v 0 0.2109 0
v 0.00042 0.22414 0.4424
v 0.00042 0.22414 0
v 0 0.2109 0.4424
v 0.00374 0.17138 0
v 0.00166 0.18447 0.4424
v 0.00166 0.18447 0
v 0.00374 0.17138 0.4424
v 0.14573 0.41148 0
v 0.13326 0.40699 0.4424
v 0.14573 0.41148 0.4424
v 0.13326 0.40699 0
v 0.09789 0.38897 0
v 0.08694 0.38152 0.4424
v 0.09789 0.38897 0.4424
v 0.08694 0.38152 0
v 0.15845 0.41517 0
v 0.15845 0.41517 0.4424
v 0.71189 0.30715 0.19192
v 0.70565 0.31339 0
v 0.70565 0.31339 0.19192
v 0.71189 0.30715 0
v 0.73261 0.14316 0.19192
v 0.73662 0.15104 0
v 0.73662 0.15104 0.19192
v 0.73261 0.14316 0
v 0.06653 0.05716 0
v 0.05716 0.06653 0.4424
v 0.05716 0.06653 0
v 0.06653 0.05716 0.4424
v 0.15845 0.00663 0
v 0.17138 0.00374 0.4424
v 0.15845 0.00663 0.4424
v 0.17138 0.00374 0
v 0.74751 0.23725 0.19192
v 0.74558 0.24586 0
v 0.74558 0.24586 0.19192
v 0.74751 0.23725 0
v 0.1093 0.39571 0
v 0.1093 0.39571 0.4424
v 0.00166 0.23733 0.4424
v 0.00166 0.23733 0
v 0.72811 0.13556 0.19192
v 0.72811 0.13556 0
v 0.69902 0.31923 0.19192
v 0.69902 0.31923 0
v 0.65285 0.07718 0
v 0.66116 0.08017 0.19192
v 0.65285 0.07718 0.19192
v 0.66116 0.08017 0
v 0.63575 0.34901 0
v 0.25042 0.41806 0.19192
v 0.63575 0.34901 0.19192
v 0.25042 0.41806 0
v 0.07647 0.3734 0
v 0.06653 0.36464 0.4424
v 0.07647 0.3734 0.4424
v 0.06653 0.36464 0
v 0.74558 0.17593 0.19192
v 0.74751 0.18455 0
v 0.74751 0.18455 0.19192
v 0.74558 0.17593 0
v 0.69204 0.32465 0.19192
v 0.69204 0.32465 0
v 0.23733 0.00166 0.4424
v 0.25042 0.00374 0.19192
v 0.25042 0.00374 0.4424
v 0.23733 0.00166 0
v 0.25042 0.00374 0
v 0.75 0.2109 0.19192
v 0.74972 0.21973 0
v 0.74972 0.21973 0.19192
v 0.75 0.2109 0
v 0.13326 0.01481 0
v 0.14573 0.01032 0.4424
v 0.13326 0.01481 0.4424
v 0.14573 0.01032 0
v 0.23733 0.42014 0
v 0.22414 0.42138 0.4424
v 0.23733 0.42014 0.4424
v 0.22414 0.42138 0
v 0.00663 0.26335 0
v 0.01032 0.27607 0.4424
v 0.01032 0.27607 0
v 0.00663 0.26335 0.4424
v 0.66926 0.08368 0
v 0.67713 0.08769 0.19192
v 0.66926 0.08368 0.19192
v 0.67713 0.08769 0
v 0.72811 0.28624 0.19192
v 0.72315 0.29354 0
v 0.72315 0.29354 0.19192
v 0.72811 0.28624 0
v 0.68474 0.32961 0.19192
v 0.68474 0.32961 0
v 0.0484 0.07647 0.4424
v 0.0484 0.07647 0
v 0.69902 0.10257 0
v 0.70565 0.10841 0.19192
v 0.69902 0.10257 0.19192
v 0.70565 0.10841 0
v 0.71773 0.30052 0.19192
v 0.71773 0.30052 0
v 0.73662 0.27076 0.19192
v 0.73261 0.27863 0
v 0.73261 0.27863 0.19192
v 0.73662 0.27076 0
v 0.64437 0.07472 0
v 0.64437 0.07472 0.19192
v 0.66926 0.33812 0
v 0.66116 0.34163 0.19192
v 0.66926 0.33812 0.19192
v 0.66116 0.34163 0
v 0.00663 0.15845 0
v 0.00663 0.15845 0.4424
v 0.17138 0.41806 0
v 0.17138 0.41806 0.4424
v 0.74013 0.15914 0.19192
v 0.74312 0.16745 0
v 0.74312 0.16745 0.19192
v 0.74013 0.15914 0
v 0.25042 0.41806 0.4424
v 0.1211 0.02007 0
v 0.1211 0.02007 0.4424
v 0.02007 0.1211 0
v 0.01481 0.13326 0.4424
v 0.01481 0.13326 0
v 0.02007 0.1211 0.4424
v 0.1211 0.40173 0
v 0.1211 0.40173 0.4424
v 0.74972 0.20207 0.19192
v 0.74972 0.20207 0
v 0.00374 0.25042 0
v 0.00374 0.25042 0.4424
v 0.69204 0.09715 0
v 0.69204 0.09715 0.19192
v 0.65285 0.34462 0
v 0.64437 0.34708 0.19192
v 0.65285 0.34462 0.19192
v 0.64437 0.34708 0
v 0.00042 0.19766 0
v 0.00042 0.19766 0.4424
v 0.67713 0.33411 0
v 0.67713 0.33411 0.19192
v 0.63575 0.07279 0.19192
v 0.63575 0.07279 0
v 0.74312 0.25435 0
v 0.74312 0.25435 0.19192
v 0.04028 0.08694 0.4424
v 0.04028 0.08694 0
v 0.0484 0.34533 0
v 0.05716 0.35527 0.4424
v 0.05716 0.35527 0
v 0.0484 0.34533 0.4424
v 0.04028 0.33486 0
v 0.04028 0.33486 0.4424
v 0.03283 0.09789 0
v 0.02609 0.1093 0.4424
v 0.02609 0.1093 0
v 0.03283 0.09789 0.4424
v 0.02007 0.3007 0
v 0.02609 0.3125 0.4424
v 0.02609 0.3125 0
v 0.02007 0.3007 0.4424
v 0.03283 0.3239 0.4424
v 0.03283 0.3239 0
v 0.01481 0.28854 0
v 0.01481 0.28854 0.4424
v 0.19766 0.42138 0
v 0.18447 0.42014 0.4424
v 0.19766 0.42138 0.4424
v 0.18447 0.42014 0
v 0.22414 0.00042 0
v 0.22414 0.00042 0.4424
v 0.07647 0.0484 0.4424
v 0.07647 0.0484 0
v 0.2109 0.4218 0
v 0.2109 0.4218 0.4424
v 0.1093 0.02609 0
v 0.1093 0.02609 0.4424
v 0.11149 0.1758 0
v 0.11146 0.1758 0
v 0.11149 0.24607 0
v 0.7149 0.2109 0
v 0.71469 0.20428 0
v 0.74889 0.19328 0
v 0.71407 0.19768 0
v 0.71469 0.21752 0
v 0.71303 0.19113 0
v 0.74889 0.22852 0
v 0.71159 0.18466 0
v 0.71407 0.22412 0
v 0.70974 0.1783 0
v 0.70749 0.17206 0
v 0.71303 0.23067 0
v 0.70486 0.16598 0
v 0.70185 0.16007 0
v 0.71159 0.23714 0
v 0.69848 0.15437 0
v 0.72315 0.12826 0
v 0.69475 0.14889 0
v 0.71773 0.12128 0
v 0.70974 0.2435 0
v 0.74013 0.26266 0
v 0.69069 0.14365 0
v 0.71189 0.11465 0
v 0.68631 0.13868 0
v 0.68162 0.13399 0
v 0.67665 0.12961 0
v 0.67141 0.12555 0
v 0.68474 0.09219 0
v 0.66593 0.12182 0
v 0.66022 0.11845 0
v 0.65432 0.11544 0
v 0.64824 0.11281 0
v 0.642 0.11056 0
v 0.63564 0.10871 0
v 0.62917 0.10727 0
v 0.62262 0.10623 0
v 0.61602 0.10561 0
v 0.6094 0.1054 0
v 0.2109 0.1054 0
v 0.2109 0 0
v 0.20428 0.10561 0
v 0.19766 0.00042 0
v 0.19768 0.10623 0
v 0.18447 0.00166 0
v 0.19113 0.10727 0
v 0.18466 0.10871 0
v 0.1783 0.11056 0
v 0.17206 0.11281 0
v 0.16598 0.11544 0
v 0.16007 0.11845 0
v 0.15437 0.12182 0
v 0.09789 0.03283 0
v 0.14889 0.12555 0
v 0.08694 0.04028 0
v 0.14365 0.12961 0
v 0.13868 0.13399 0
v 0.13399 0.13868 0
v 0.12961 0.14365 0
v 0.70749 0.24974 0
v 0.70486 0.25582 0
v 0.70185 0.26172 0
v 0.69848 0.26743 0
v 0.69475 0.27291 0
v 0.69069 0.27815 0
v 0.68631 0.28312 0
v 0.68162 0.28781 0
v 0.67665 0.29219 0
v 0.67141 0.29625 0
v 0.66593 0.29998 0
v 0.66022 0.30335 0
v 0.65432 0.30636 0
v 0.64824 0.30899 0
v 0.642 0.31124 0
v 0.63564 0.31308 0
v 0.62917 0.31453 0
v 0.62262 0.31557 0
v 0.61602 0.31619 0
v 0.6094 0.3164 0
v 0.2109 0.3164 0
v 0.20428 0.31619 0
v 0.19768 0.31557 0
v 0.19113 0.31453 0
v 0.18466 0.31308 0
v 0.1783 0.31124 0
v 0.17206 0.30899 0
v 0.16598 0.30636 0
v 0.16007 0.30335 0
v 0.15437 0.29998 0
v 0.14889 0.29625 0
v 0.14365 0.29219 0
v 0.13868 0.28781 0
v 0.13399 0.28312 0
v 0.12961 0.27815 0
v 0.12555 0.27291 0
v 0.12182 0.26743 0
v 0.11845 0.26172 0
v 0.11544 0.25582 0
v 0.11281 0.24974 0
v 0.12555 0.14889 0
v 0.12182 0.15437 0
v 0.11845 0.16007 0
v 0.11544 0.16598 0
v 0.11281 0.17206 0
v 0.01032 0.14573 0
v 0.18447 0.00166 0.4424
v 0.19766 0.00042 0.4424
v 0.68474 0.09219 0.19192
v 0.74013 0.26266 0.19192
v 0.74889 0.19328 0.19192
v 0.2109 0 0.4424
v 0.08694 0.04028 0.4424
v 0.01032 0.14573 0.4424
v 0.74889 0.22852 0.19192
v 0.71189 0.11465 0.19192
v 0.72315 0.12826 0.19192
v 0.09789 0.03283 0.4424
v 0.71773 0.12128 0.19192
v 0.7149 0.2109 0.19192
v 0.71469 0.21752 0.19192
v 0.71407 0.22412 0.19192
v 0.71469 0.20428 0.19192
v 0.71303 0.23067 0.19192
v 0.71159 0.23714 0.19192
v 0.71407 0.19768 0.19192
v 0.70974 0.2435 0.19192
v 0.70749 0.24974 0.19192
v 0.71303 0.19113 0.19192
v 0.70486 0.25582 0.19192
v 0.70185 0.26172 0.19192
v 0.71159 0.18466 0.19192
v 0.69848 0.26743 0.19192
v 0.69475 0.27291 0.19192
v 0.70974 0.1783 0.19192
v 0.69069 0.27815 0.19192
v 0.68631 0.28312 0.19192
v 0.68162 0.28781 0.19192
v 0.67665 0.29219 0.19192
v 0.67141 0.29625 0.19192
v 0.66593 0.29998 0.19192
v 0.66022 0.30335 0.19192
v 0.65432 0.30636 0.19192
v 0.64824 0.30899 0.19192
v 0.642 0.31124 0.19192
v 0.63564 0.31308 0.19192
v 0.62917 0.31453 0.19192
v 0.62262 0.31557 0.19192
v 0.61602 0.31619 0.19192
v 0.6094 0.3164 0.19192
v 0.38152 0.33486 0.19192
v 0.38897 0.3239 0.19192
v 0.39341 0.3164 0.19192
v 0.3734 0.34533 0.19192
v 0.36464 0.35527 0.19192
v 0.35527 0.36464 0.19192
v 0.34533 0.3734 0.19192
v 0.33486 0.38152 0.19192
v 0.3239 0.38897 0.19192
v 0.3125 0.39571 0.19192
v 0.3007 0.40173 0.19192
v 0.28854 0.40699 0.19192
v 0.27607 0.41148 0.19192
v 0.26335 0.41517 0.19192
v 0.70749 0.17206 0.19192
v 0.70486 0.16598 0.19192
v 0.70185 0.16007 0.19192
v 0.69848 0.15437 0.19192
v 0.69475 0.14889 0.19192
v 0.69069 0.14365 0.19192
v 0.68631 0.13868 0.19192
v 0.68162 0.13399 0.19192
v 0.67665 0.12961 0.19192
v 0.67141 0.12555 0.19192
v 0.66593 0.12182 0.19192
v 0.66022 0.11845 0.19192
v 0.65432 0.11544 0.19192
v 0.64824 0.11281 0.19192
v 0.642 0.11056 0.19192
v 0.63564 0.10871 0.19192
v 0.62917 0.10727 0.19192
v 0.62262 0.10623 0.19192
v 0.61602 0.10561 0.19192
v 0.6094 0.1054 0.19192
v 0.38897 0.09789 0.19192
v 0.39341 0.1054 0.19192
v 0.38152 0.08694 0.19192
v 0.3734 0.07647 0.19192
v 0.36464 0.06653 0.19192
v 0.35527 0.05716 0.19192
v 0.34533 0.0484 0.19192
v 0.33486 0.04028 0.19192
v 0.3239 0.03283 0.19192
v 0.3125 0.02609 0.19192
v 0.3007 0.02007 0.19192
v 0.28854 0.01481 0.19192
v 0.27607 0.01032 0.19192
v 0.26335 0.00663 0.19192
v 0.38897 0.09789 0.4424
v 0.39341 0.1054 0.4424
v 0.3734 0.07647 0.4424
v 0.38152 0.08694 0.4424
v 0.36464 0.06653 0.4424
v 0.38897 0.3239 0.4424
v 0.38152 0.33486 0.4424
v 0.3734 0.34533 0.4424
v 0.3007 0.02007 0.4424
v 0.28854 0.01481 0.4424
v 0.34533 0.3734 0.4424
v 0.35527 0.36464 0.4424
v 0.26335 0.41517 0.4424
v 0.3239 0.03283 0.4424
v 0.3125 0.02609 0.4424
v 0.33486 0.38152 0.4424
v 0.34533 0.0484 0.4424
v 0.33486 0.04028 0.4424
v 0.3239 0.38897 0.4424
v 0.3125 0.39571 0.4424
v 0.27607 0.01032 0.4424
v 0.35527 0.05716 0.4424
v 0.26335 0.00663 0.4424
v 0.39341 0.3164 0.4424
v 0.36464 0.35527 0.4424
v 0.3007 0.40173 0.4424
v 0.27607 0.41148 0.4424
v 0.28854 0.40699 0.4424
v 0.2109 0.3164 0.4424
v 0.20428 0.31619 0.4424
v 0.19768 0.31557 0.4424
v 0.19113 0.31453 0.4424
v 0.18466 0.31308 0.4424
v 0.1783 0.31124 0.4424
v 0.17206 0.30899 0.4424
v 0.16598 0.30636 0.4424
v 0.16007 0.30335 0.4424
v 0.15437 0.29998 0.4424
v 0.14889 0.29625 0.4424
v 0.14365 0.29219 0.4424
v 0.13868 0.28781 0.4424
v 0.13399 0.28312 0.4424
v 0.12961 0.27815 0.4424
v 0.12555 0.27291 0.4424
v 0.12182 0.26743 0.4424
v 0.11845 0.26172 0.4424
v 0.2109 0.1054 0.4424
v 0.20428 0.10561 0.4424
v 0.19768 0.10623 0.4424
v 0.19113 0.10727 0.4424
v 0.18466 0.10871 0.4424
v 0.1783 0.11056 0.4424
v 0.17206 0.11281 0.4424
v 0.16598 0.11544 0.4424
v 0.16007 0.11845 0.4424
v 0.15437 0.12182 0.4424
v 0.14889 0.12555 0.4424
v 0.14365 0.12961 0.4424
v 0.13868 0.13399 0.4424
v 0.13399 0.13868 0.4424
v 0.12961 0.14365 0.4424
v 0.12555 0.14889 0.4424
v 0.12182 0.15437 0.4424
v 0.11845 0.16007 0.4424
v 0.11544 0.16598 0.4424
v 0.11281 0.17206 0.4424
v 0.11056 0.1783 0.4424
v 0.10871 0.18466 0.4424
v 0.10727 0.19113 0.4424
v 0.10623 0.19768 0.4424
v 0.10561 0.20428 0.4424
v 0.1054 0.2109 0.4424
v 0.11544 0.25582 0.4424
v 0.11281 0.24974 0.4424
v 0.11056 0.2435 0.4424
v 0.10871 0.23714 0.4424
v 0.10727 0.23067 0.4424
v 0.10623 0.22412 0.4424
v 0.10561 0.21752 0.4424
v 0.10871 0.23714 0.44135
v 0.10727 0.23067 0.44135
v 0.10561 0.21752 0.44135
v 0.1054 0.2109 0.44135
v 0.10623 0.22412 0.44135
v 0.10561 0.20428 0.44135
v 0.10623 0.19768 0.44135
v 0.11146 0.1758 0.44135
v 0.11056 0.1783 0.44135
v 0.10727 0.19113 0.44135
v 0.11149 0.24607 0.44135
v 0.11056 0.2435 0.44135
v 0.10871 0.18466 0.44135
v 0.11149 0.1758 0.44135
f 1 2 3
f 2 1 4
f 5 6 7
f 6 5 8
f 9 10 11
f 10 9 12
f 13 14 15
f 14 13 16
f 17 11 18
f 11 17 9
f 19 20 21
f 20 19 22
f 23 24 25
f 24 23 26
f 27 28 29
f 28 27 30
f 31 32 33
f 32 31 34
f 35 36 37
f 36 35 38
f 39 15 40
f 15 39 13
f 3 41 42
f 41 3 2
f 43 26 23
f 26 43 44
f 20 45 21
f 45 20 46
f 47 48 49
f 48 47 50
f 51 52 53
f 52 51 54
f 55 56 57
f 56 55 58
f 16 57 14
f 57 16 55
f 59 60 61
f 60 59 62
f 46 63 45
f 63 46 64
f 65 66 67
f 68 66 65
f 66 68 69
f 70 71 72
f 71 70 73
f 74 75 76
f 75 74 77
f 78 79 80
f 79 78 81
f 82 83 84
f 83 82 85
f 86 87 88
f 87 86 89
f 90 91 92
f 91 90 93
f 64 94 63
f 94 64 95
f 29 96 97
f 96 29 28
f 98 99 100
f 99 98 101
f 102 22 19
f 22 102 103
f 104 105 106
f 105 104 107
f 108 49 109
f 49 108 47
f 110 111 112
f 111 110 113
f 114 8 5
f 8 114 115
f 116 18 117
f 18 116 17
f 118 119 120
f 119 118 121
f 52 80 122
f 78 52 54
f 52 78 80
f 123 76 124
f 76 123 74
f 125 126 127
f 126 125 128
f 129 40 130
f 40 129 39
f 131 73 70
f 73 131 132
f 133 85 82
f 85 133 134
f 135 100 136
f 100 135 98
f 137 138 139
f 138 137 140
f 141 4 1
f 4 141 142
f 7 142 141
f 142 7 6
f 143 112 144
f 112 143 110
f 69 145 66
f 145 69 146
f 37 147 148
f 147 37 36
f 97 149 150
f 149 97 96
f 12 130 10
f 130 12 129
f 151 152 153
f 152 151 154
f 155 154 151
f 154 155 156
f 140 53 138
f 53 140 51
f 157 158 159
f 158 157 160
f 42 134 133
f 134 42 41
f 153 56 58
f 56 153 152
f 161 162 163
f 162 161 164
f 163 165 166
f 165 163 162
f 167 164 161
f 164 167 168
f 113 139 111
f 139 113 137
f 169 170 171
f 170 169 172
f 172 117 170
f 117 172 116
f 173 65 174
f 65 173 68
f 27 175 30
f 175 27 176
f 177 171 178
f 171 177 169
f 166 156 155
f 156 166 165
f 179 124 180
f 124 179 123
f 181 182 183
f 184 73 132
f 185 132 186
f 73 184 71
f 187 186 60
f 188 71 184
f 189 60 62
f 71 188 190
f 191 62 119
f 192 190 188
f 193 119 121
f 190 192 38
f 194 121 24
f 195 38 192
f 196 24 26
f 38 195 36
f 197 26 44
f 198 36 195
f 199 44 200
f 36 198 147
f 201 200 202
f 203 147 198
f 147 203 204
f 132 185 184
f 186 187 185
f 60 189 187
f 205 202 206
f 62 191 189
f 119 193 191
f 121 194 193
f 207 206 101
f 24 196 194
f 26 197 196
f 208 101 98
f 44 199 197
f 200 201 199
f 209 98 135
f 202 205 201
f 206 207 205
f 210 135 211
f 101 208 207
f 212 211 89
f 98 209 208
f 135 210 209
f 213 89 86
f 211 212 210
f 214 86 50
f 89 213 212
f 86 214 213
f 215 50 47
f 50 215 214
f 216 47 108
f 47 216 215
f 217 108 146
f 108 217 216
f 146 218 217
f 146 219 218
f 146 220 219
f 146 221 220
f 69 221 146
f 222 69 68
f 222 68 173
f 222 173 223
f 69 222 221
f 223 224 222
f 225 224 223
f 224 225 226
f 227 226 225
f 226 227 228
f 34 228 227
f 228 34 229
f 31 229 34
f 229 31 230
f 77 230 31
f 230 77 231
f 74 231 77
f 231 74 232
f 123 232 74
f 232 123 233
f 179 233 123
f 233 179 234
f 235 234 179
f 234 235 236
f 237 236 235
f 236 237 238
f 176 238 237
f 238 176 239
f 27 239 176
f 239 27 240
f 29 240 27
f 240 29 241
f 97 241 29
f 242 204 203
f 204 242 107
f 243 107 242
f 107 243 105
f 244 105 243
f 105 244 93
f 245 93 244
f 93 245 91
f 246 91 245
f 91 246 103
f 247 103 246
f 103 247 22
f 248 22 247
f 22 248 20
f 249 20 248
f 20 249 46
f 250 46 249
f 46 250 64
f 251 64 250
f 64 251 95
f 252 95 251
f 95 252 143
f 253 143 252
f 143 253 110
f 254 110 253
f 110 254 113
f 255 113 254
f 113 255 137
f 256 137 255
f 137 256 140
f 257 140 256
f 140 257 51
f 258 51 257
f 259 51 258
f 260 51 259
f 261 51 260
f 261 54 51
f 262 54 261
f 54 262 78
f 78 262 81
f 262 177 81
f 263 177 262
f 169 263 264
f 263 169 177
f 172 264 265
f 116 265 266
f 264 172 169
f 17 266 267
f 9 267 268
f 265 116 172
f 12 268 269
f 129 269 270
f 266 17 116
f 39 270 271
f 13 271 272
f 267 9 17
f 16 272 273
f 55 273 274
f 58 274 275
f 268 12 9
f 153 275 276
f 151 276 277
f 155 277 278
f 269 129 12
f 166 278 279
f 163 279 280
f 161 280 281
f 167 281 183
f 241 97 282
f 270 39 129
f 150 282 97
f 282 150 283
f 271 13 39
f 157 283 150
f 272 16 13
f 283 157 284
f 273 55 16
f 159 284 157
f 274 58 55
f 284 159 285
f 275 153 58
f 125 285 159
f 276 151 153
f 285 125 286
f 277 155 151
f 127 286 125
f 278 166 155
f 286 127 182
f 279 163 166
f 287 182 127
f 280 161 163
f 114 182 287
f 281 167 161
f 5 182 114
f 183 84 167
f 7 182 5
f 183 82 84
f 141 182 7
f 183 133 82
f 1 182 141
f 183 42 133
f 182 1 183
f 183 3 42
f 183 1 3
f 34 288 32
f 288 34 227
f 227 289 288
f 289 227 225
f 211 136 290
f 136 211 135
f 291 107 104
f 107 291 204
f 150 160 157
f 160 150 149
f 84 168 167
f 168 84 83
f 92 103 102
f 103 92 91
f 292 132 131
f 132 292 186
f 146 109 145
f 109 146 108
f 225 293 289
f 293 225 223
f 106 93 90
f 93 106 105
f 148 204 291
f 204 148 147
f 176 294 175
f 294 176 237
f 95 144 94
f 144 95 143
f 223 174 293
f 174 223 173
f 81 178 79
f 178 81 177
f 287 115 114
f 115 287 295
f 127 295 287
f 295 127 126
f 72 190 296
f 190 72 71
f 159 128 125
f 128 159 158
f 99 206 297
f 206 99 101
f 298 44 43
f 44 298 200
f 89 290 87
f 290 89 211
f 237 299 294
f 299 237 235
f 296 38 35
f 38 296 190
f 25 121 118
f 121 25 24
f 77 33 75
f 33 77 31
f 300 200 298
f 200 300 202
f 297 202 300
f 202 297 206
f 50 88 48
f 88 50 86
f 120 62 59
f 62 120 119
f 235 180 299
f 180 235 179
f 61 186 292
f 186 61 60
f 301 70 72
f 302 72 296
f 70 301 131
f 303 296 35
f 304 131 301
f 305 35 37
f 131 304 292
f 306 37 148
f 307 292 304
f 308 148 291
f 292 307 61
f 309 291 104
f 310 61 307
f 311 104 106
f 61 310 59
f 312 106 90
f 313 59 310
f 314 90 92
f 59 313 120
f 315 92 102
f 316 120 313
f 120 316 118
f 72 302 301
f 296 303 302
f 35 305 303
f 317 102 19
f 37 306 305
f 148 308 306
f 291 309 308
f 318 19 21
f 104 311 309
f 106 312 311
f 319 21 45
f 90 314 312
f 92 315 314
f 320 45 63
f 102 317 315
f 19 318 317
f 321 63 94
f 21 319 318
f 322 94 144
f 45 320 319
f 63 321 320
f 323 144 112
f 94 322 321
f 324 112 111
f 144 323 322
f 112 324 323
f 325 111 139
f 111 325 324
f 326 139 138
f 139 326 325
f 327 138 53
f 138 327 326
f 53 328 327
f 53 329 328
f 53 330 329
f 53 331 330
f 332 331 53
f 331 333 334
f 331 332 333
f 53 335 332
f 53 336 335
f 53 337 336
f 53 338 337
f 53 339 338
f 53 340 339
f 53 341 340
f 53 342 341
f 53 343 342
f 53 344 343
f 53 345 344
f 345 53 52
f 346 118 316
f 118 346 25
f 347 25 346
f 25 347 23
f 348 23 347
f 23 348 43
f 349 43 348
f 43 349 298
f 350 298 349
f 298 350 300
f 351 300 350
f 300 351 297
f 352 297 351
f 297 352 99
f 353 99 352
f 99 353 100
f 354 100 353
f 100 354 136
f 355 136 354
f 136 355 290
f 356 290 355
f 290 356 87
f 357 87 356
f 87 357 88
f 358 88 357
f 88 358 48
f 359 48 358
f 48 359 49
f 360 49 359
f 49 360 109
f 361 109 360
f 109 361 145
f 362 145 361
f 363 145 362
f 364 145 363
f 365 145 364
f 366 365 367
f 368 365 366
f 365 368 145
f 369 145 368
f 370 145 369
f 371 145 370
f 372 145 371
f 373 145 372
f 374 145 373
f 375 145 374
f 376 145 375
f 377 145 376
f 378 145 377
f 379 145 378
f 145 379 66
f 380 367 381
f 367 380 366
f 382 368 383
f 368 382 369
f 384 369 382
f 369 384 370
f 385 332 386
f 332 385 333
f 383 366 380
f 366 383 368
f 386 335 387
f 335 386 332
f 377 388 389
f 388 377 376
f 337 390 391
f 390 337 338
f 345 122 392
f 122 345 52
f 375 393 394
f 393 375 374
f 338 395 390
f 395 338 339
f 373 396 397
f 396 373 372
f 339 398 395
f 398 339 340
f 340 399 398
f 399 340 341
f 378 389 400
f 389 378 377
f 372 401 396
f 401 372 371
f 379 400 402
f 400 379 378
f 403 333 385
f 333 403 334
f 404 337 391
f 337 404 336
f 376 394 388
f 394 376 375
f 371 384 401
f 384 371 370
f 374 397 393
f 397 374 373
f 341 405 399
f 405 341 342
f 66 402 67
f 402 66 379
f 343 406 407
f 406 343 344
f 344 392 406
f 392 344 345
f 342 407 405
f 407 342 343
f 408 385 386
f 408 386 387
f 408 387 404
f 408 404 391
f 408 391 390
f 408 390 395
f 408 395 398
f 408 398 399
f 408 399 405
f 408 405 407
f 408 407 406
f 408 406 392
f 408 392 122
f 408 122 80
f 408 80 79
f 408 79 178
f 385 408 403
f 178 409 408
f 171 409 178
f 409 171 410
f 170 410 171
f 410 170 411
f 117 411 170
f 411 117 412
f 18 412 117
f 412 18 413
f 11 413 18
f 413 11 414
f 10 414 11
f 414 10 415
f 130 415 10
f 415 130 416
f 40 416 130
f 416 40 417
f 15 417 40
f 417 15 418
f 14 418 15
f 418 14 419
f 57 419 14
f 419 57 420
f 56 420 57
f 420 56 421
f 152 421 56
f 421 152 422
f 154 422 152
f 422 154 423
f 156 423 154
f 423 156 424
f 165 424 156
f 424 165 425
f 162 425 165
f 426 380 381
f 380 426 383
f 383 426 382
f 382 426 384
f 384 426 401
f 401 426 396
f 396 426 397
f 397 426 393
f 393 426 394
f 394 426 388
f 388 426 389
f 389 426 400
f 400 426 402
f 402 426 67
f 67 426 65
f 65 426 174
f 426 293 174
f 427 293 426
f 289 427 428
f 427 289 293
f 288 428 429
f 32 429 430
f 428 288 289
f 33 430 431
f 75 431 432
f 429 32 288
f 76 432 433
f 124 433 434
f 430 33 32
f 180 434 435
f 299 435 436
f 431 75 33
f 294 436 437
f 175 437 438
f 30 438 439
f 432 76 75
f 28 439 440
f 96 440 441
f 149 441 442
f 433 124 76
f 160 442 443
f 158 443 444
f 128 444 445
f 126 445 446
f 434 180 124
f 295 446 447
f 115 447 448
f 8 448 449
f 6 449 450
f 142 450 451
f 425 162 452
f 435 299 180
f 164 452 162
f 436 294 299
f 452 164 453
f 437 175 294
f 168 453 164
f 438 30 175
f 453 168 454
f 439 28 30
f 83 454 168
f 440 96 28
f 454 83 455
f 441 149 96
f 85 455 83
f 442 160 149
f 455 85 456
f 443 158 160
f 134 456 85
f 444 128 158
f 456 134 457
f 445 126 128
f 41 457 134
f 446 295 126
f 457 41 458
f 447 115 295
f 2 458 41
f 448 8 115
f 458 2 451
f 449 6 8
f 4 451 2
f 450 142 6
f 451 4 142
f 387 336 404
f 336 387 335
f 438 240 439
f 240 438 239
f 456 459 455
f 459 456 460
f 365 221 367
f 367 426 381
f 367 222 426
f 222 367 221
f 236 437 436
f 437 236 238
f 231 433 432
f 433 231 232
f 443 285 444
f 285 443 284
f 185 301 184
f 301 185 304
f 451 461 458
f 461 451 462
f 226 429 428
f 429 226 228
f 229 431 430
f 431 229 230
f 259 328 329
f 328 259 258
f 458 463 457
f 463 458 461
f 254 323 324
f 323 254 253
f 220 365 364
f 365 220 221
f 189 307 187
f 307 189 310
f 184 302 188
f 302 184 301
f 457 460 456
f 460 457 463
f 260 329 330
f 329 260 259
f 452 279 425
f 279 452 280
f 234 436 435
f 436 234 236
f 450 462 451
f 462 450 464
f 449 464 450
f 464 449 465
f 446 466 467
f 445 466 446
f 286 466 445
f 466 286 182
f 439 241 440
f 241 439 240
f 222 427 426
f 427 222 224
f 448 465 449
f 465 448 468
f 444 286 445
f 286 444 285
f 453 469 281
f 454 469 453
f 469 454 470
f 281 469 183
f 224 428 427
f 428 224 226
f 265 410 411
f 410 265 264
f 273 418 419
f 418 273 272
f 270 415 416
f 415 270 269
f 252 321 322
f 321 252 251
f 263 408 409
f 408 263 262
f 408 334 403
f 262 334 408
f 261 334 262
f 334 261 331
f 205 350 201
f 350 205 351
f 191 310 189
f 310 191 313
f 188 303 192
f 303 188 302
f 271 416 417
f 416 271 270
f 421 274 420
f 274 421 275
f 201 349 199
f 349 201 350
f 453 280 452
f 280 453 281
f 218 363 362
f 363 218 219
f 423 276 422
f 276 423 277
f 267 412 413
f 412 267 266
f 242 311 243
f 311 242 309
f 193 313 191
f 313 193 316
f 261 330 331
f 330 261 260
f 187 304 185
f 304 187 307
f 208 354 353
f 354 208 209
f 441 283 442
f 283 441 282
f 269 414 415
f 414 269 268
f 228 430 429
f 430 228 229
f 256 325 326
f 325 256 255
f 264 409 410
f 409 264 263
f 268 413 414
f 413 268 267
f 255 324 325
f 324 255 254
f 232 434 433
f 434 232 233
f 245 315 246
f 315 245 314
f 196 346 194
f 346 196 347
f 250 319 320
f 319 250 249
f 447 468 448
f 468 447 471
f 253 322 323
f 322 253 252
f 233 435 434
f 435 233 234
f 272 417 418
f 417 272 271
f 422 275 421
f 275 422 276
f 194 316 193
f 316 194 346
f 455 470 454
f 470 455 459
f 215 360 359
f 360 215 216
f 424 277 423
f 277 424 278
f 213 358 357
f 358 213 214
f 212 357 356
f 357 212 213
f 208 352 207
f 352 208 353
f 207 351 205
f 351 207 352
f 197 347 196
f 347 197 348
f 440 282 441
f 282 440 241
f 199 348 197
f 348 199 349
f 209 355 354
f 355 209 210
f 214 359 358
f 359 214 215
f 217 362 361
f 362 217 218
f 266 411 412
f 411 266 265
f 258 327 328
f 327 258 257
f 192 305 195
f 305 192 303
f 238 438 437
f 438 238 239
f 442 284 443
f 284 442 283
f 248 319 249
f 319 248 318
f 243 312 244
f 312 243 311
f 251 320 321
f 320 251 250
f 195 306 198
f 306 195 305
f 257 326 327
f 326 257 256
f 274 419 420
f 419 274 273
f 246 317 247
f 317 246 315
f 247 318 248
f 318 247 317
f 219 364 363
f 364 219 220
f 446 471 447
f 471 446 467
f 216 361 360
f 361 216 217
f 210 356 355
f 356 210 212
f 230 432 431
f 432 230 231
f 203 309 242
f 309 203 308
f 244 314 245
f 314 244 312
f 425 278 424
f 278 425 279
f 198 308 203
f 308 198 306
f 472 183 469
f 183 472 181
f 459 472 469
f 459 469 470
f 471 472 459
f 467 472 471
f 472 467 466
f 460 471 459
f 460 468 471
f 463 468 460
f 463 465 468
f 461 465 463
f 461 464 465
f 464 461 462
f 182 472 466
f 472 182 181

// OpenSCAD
// --- Parameters ---

// Base dimensions
base_length = 0.75;
base_width = 0.421875;
base_height = 0.191921;

// Left circular profile (Forms the left side of the base and the taller section)
left_center_x = 0.2109;
left_center_y = 0.2109;
left_outer_r = 0.2109;
left_inner_r = 0.1055; // Inner radius matching the slot opening

// Right circular profile (Forms the right side of the base)
right_center_x = 0.6094;
right_center_y = 0.2109;
right_outer_r = 0.1406;
right_inner_r = 0.1055;

// Taller section height (Extruded from base datum)
tall_height = 0.4424;

// Upright tab dimensions and position
tab_length = 0.041188;
tab_width = 0.070313;
tab_height = 0.441346;
tab_offset_x = 0.0703;
tab_offset_y = 0.1758;

// Global resolution for smooth curves
$fn = 100;

// --- Main Model ---

union() {
    // Main body with voids subtracted
    difference() {
        // Solid bodies
        union() {
            // Lower base extrusion
            // Formed by hulling the two outer circular profiles to create a continuous span
            linear_extrude(height = base_height) {
                hull() {
                    translate([left_center_x, left_center_y]) 
                        circle(r = left_outer_r);
                    translate([right_center_x, right_center_y]) 
                        circle(r = right_outer_r);
                }
            }
            
            // Taller circular solid section
            // Positioned over the left-side axis, starting from the base datum (Z=0)
            linear_extrude(height = tall_height) {
                translate([left_center_x, left_center_y]) 
                    circle(r = left_outer_r);
            }
        }
        
        // Inner openings / true voids
        // Formed as a rounded slot connecting the left and right inner radii
        // Cut through the entire height of the model
        translate([0, 0, -1]) {
            linear_extrude(height = tall_height + 2) {
                hull() {
                    translate([left_center_x, left_center_y]) 
                        circle(r = left_inner_r);
                    translate([right_center_x, right_center_y]) 
                        circle(r = right_inner_r);
                }
            }
        }
    }
    
    // Separate solid rectangular upright tab
    // Unioned after the difference to ensure it remains a solid feature
    translate([tab_offset_x, tab_offset_y, 0]) {
        cube([tab_length, tab_width, tab_height]);
    }
}
